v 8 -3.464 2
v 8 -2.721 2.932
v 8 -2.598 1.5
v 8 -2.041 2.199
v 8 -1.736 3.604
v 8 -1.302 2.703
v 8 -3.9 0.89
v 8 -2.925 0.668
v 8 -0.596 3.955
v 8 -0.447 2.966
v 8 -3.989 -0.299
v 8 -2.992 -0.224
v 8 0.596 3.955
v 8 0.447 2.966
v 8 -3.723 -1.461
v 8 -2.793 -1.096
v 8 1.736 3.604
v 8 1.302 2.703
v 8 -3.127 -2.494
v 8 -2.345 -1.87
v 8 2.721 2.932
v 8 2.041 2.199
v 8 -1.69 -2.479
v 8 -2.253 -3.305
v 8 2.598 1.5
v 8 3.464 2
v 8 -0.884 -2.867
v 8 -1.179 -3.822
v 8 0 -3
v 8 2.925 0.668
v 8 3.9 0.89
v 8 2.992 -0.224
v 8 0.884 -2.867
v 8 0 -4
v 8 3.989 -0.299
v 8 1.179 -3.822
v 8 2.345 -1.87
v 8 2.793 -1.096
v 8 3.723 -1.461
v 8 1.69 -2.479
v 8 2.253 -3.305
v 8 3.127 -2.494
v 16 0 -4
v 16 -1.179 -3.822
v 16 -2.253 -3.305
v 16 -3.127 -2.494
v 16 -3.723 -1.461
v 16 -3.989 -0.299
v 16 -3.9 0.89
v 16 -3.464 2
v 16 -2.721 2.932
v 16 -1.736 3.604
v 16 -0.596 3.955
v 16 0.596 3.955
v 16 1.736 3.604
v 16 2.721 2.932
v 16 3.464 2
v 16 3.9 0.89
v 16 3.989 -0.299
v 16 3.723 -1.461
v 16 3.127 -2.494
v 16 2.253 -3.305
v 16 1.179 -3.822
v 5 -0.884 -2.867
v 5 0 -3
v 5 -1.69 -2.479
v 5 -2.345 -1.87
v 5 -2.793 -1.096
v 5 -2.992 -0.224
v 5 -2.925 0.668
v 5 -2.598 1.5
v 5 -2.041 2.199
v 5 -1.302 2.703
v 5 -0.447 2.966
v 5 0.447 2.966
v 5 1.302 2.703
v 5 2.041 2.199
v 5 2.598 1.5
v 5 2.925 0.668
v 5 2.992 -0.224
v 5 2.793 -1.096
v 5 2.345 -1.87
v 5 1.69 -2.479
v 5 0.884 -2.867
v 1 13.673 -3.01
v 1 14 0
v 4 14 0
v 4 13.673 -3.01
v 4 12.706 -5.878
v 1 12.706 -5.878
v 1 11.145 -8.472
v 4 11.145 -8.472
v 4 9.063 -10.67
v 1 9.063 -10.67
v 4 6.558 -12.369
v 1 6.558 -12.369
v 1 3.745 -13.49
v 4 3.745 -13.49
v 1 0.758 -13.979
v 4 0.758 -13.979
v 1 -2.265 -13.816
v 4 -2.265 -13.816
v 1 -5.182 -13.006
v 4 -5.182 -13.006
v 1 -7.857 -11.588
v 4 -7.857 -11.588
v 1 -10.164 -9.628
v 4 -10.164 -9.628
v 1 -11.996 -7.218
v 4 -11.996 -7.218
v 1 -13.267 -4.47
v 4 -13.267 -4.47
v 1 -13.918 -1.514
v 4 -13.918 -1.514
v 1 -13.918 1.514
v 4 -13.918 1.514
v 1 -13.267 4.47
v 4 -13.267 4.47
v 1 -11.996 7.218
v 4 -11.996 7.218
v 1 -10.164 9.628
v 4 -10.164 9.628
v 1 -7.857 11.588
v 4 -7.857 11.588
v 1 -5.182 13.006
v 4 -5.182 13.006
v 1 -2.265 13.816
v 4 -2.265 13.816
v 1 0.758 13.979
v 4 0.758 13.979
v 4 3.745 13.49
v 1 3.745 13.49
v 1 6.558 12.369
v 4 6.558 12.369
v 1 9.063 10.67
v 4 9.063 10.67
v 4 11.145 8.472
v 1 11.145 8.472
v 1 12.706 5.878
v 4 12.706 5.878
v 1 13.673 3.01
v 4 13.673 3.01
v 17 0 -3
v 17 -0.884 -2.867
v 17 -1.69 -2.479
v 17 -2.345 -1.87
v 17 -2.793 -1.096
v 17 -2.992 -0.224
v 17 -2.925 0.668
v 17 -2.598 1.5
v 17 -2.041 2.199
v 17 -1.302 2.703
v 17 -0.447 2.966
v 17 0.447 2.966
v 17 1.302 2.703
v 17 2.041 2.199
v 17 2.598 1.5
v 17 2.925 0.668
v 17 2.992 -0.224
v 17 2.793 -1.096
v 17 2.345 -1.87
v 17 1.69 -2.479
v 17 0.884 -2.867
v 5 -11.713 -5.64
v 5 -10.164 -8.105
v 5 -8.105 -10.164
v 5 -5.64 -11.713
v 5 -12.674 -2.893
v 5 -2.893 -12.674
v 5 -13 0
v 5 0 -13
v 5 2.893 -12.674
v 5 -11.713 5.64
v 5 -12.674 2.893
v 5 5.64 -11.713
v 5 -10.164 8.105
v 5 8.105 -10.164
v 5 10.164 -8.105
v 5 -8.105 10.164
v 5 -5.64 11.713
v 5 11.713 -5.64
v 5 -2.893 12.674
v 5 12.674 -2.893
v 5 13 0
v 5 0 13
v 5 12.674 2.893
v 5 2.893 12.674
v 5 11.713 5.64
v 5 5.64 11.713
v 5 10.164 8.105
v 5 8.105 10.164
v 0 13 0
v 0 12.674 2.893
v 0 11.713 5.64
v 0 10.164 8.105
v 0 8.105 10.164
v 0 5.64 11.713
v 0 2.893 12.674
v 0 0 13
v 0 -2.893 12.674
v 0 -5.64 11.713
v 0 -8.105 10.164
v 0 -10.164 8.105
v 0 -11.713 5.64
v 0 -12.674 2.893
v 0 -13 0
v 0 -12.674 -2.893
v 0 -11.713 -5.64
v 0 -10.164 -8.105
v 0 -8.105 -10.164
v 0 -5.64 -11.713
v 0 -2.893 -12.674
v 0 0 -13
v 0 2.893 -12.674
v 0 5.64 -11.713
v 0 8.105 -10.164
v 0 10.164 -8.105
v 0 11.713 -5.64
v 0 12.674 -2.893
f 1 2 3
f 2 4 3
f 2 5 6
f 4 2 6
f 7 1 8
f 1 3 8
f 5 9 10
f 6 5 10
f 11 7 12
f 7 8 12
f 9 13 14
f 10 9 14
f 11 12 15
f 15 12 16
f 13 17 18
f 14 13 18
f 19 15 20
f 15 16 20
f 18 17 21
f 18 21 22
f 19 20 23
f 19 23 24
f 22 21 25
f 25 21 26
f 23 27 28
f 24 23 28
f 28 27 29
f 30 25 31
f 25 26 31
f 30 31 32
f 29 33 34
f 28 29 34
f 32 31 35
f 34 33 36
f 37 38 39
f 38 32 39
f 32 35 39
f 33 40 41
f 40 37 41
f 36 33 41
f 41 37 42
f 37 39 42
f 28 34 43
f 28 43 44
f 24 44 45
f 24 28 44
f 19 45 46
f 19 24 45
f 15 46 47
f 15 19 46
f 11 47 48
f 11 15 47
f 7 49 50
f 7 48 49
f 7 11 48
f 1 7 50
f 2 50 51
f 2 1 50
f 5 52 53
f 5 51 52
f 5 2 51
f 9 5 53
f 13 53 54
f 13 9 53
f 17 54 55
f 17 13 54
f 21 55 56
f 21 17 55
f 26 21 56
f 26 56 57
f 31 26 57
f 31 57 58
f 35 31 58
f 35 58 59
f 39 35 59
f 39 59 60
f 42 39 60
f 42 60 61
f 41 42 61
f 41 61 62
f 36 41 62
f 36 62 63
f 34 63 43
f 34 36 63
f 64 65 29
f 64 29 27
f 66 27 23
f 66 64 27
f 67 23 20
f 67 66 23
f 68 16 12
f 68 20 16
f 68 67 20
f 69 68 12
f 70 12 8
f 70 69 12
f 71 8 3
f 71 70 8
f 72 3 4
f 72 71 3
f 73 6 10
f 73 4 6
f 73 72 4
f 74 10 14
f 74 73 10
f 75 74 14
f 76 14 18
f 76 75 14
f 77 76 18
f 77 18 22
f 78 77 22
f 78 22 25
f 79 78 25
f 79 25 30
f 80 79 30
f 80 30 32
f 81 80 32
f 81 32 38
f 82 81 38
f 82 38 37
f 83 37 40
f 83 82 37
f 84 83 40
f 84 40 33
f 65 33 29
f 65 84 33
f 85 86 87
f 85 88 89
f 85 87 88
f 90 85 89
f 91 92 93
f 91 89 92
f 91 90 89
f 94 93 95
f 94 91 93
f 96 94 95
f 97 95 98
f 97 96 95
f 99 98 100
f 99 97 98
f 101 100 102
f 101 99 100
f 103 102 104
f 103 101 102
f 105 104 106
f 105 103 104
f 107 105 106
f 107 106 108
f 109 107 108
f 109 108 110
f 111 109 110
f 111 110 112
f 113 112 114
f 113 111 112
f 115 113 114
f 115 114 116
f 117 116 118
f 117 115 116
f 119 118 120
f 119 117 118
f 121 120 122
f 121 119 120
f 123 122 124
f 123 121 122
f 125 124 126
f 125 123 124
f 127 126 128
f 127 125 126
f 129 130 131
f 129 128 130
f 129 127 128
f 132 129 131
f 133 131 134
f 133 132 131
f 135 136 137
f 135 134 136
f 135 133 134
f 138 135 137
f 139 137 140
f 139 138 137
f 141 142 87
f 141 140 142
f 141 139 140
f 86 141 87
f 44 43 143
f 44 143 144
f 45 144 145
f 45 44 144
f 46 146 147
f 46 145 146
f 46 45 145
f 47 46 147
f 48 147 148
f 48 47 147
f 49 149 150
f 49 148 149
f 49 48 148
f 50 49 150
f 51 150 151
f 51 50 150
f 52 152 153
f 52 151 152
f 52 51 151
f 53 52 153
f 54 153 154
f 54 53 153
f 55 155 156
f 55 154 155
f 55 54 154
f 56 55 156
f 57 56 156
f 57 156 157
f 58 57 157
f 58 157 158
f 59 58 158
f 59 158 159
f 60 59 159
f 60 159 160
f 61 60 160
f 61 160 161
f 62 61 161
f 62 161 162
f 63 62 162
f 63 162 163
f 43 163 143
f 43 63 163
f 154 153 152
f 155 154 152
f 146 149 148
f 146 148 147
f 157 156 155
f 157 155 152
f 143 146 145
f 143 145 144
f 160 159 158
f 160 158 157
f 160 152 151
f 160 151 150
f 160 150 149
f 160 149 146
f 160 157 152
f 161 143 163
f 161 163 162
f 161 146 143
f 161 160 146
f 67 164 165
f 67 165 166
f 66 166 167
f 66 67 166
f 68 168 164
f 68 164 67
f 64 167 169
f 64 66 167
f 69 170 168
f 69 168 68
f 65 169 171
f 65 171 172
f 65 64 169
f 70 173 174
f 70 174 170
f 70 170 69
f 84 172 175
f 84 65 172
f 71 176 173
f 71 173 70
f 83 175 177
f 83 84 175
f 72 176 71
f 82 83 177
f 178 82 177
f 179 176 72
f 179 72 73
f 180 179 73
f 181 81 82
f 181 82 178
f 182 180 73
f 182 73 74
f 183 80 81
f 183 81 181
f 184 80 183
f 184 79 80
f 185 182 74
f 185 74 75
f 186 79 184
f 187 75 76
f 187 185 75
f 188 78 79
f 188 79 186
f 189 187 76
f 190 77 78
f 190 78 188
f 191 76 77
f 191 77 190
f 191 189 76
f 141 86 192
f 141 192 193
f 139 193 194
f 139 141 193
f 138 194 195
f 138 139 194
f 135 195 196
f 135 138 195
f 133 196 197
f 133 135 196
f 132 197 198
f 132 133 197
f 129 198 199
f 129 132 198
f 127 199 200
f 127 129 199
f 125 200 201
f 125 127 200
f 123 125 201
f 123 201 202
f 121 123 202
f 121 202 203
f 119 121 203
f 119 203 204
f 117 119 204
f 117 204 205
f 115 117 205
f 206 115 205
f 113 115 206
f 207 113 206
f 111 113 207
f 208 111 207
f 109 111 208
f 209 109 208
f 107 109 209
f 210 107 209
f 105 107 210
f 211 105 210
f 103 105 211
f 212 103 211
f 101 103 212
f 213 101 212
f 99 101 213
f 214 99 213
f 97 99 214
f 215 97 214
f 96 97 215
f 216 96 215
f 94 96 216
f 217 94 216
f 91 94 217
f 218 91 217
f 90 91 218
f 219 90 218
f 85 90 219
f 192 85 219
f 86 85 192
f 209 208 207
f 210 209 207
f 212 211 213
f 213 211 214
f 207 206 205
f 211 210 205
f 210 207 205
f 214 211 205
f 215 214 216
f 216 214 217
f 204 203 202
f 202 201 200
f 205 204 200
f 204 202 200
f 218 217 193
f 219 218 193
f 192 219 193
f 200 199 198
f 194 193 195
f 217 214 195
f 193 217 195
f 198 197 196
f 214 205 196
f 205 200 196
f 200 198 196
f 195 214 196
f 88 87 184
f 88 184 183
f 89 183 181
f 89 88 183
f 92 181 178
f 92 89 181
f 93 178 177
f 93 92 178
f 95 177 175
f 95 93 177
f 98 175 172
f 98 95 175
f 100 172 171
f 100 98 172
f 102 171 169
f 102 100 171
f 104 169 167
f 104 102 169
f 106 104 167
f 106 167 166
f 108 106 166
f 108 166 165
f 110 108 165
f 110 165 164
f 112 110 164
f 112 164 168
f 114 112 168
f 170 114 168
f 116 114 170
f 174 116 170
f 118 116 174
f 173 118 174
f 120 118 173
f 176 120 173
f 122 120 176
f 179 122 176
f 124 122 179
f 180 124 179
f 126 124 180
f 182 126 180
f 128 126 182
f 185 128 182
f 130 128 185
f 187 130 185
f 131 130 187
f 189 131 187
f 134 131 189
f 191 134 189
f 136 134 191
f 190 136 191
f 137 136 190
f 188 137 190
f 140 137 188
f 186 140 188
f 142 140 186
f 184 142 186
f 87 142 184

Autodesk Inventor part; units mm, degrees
ref_plane "YZ Plane" through (0, 0, 0) normal (1, 0, 0) x (0, 1, 0)
ref_plane "XZ Plane" through (0, 0, 0) normal (0, 1, 0) x (-1, 0, 0)
ref_plane "XY Plane" through (0, 0, 0) normal (0, 0, 1) x (1, 0, 0)
sketch "草圖1" plane through (0, 0, 0) normal (1, 0, 0) x (0, 1, 0)
  circle A0 centre (0, 0) radius 14
  dimension "d0" = 28
extrude "擠出1" add sketch "草圖1" along normal blind 5
sketch "草圖2" plane through (5, 0, 0) normal (1, 0, 0) x (0, 0, -1)
  circle A0 centre (0, 0) radius 3
  dimension "d3" = 6
extrude "擠出2" add sketch "草圖2" along normal blind 3
sketch "草圖3" plane through (8, 0, 0) normal (1, 0, 0) x (0, 0, -1)
  circle A0 centre (0, 0) radius 4
  dimension "d6" = 8
extrude "擠出3" add sketch "草圖3" along normal blind 9
chamfer "倒角1" distance 1 angle 45 3 edges at (17, 0, 4) (5, -14, 0) (0, -14, 0)
thread "螺紋1" size "M8x1.25" class "6g" standard "ANSI Metric M Profile" full length
properties part number "2. 螺栓"
